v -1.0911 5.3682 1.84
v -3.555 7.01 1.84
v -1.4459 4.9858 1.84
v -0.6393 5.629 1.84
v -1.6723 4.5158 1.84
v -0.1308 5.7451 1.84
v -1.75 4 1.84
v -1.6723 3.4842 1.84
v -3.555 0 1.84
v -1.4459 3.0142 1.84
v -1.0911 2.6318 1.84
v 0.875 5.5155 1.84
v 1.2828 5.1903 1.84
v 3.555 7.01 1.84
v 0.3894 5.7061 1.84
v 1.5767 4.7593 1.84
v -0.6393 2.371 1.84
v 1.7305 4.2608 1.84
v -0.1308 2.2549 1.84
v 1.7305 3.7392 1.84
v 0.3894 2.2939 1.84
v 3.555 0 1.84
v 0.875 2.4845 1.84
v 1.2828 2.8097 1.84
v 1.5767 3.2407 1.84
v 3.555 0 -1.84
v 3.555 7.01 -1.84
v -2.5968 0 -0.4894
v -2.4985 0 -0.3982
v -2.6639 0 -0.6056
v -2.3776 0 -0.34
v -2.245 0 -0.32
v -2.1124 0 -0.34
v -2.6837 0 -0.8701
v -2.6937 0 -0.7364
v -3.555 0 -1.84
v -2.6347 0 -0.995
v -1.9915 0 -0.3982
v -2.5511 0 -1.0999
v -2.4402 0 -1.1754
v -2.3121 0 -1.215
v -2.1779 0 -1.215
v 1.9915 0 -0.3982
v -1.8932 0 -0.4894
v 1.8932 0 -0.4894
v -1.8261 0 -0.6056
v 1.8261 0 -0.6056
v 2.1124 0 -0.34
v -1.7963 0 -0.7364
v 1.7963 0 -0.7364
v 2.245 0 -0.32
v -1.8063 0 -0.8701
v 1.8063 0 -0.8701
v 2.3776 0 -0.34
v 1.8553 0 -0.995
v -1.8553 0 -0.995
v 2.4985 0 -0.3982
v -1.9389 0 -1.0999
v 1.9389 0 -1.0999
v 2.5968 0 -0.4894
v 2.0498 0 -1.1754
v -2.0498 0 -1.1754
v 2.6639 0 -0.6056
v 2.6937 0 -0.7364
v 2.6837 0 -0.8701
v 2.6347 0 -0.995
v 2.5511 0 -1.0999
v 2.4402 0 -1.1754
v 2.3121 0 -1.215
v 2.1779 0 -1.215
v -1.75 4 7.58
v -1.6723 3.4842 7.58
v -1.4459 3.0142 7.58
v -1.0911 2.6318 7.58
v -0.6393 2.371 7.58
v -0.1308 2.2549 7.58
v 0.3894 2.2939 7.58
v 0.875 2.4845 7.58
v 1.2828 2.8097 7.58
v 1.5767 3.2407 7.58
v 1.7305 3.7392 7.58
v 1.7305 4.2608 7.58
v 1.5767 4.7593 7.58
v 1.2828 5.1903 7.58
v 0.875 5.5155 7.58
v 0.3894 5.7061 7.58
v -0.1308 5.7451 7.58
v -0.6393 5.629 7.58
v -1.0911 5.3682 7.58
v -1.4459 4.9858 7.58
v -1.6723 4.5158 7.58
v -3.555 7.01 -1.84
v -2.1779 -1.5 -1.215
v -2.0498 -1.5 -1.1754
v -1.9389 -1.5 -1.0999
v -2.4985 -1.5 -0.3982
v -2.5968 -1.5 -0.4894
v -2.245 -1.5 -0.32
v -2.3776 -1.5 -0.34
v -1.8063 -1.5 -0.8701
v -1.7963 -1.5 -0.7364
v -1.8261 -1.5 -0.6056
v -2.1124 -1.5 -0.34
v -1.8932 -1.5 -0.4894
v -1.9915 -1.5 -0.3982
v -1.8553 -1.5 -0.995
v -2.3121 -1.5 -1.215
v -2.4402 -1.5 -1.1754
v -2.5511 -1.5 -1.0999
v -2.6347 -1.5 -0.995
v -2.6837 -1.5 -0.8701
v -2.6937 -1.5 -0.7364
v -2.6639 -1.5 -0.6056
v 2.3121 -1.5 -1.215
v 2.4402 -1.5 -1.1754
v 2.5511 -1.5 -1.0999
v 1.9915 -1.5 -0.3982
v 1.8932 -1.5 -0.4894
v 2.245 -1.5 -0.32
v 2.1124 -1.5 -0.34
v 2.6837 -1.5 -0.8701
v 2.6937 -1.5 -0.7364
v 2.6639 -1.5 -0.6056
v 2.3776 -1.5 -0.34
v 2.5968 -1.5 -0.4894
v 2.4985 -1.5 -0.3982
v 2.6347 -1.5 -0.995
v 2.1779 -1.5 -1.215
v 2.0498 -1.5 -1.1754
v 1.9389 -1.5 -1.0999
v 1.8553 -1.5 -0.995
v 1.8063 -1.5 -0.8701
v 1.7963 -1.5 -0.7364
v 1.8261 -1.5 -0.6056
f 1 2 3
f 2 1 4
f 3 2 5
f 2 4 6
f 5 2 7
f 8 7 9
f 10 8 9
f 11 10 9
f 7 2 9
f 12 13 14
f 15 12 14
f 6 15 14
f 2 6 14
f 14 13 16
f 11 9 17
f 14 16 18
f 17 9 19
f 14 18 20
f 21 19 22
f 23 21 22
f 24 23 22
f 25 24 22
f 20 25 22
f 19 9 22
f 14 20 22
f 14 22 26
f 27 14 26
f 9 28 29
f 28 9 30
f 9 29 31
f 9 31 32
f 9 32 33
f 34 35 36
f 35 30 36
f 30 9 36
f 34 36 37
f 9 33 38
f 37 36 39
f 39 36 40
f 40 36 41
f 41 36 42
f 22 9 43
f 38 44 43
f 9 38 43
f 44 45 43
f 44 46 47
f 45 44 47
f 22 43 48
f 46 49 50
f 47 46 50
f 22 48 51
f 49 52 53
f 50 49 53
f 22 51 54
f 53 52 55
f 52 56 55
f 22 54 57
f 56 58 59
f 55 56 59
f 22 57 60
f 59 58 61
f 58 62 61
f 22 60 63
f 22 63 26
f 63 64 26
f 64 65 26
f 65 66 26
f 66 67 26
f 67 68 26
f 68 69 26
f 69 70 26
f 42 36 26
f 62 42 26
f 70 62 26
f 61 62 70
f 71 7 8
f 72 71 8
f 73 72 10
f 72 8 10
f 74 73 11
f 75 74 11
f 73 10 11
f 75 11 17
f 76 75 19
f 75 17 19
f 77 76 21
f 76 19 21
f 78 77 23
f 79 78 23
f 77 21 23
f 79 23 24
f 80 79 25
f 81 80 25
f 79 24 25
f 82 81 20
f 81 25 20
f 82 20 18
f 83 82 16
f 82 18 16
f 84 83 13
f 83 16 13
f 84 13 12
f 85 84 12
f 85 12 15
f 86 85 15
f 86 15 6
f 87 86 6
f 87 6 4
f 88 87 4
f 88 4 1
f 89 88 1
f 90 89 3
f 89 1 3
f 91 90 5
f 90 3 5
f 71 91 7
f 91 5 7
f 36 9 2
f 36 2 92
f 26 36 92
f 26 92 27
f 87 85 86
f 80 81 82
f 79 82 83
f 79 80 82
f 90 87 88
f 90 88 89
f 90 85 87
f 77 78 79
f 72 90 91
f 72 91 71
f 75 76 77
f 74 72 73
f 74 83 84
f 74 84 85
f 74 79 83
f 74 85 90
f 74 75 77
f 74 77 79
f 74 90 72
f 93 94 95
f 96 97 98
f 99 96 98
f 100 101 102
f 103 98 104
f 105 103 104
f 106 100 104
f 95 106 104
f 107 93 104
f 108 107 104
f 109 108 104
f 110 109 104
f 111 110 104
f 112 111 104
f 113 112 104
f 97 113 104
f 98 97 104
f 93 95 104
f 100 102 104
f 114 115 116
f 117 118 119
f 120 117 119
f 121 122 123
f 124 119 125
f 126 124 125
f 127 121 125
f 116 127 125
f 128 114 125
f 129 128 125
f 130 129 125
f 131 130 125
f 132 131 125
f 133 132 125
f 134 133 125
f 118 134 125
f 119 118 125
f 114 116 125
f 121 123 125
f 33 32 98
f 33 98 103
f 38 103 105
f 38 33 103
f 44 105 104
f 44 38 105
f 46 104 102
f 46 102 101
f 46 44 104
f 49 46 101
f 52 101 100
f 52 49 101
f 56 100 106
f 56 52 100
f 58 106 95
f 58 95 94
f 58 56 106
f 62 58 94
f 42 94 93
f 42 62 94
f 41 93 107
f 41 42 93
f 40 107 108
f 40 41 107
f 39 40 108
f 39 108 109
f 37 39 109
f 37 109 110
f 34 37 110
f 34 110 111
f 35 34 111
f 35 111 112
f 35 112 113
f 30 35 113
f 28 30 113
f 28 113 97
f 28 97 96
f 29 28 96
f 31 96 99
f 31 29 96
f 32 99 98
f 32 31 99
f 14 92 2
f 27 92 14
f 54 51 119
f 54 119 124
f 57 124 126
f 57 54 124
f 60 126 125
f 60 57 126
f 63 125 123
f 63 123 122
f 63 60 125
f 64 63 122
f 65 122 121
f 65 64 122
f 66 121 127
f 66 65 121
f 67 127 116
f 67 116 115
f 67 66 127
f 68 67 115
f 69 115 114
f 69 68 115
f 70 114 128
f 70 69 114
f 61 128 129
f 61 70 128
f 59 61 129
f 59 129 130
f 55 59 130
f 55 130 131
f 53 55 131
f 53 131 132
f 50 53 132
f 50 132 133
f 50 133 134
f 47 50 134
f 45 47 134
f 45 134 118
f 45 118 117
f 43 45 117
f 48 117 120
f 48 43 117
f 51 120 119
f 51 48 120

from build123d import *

# Parameters (mm, degrees)
SKETCH1_W           = 7.11
SKETCH1_H           = 3.68
BOSS_EXTRUDE1_DEPTH = 7.01
SKETCH2_R           = 1.75
BOSS_EXTRUDE2_DEPTH = 5.74
SKETCH3_R           = 0.45
BOSS_EXTRUDE3_DEPTH = 1.5


with BuildPart() as part:
    # Sketch1 → Boss-Extrude1 (new body)
    with BuildSketch(Plane(origin=(0, 0, 0), x_dir=(1, 0, 0), z_dir=(0, 1, 0))):
        Rectangle(SKETCH1_W, SKETCH1_H)
    extrude(amount=BOSS_EXTRUDE1_DEPTH)

    # Sketch2 → Boss-Extrude2 (add)
    with BuildSketch(Plane.XY.offset(1.84)):
        with Locations(Location((0, 4, 0), (0, 0, 180))):
            Circle(SKETCH2_R)
    extrude(amount=BOSS_EXTRUDE2_DEPTH)

    # Sketch3 → Boss-Extrude3 (add)
    with BuildSketch(Plane(origin=(0, 0, 0), x_dir=(1, 0, 0), z_dir=(0, 1, 0))):
        with Locations(Location((-2.245, 0.77, 0), (0, 0, 270))):
            Circle(SKETCH3_R)
        with Locations(Location((2.245, 0.77, 0), (0, 0, 270))):
            Circle(SKETCH3_R)
    extrude(amount=-BOSS_EXTRUDE3_DEPTH)


solid = part.part
